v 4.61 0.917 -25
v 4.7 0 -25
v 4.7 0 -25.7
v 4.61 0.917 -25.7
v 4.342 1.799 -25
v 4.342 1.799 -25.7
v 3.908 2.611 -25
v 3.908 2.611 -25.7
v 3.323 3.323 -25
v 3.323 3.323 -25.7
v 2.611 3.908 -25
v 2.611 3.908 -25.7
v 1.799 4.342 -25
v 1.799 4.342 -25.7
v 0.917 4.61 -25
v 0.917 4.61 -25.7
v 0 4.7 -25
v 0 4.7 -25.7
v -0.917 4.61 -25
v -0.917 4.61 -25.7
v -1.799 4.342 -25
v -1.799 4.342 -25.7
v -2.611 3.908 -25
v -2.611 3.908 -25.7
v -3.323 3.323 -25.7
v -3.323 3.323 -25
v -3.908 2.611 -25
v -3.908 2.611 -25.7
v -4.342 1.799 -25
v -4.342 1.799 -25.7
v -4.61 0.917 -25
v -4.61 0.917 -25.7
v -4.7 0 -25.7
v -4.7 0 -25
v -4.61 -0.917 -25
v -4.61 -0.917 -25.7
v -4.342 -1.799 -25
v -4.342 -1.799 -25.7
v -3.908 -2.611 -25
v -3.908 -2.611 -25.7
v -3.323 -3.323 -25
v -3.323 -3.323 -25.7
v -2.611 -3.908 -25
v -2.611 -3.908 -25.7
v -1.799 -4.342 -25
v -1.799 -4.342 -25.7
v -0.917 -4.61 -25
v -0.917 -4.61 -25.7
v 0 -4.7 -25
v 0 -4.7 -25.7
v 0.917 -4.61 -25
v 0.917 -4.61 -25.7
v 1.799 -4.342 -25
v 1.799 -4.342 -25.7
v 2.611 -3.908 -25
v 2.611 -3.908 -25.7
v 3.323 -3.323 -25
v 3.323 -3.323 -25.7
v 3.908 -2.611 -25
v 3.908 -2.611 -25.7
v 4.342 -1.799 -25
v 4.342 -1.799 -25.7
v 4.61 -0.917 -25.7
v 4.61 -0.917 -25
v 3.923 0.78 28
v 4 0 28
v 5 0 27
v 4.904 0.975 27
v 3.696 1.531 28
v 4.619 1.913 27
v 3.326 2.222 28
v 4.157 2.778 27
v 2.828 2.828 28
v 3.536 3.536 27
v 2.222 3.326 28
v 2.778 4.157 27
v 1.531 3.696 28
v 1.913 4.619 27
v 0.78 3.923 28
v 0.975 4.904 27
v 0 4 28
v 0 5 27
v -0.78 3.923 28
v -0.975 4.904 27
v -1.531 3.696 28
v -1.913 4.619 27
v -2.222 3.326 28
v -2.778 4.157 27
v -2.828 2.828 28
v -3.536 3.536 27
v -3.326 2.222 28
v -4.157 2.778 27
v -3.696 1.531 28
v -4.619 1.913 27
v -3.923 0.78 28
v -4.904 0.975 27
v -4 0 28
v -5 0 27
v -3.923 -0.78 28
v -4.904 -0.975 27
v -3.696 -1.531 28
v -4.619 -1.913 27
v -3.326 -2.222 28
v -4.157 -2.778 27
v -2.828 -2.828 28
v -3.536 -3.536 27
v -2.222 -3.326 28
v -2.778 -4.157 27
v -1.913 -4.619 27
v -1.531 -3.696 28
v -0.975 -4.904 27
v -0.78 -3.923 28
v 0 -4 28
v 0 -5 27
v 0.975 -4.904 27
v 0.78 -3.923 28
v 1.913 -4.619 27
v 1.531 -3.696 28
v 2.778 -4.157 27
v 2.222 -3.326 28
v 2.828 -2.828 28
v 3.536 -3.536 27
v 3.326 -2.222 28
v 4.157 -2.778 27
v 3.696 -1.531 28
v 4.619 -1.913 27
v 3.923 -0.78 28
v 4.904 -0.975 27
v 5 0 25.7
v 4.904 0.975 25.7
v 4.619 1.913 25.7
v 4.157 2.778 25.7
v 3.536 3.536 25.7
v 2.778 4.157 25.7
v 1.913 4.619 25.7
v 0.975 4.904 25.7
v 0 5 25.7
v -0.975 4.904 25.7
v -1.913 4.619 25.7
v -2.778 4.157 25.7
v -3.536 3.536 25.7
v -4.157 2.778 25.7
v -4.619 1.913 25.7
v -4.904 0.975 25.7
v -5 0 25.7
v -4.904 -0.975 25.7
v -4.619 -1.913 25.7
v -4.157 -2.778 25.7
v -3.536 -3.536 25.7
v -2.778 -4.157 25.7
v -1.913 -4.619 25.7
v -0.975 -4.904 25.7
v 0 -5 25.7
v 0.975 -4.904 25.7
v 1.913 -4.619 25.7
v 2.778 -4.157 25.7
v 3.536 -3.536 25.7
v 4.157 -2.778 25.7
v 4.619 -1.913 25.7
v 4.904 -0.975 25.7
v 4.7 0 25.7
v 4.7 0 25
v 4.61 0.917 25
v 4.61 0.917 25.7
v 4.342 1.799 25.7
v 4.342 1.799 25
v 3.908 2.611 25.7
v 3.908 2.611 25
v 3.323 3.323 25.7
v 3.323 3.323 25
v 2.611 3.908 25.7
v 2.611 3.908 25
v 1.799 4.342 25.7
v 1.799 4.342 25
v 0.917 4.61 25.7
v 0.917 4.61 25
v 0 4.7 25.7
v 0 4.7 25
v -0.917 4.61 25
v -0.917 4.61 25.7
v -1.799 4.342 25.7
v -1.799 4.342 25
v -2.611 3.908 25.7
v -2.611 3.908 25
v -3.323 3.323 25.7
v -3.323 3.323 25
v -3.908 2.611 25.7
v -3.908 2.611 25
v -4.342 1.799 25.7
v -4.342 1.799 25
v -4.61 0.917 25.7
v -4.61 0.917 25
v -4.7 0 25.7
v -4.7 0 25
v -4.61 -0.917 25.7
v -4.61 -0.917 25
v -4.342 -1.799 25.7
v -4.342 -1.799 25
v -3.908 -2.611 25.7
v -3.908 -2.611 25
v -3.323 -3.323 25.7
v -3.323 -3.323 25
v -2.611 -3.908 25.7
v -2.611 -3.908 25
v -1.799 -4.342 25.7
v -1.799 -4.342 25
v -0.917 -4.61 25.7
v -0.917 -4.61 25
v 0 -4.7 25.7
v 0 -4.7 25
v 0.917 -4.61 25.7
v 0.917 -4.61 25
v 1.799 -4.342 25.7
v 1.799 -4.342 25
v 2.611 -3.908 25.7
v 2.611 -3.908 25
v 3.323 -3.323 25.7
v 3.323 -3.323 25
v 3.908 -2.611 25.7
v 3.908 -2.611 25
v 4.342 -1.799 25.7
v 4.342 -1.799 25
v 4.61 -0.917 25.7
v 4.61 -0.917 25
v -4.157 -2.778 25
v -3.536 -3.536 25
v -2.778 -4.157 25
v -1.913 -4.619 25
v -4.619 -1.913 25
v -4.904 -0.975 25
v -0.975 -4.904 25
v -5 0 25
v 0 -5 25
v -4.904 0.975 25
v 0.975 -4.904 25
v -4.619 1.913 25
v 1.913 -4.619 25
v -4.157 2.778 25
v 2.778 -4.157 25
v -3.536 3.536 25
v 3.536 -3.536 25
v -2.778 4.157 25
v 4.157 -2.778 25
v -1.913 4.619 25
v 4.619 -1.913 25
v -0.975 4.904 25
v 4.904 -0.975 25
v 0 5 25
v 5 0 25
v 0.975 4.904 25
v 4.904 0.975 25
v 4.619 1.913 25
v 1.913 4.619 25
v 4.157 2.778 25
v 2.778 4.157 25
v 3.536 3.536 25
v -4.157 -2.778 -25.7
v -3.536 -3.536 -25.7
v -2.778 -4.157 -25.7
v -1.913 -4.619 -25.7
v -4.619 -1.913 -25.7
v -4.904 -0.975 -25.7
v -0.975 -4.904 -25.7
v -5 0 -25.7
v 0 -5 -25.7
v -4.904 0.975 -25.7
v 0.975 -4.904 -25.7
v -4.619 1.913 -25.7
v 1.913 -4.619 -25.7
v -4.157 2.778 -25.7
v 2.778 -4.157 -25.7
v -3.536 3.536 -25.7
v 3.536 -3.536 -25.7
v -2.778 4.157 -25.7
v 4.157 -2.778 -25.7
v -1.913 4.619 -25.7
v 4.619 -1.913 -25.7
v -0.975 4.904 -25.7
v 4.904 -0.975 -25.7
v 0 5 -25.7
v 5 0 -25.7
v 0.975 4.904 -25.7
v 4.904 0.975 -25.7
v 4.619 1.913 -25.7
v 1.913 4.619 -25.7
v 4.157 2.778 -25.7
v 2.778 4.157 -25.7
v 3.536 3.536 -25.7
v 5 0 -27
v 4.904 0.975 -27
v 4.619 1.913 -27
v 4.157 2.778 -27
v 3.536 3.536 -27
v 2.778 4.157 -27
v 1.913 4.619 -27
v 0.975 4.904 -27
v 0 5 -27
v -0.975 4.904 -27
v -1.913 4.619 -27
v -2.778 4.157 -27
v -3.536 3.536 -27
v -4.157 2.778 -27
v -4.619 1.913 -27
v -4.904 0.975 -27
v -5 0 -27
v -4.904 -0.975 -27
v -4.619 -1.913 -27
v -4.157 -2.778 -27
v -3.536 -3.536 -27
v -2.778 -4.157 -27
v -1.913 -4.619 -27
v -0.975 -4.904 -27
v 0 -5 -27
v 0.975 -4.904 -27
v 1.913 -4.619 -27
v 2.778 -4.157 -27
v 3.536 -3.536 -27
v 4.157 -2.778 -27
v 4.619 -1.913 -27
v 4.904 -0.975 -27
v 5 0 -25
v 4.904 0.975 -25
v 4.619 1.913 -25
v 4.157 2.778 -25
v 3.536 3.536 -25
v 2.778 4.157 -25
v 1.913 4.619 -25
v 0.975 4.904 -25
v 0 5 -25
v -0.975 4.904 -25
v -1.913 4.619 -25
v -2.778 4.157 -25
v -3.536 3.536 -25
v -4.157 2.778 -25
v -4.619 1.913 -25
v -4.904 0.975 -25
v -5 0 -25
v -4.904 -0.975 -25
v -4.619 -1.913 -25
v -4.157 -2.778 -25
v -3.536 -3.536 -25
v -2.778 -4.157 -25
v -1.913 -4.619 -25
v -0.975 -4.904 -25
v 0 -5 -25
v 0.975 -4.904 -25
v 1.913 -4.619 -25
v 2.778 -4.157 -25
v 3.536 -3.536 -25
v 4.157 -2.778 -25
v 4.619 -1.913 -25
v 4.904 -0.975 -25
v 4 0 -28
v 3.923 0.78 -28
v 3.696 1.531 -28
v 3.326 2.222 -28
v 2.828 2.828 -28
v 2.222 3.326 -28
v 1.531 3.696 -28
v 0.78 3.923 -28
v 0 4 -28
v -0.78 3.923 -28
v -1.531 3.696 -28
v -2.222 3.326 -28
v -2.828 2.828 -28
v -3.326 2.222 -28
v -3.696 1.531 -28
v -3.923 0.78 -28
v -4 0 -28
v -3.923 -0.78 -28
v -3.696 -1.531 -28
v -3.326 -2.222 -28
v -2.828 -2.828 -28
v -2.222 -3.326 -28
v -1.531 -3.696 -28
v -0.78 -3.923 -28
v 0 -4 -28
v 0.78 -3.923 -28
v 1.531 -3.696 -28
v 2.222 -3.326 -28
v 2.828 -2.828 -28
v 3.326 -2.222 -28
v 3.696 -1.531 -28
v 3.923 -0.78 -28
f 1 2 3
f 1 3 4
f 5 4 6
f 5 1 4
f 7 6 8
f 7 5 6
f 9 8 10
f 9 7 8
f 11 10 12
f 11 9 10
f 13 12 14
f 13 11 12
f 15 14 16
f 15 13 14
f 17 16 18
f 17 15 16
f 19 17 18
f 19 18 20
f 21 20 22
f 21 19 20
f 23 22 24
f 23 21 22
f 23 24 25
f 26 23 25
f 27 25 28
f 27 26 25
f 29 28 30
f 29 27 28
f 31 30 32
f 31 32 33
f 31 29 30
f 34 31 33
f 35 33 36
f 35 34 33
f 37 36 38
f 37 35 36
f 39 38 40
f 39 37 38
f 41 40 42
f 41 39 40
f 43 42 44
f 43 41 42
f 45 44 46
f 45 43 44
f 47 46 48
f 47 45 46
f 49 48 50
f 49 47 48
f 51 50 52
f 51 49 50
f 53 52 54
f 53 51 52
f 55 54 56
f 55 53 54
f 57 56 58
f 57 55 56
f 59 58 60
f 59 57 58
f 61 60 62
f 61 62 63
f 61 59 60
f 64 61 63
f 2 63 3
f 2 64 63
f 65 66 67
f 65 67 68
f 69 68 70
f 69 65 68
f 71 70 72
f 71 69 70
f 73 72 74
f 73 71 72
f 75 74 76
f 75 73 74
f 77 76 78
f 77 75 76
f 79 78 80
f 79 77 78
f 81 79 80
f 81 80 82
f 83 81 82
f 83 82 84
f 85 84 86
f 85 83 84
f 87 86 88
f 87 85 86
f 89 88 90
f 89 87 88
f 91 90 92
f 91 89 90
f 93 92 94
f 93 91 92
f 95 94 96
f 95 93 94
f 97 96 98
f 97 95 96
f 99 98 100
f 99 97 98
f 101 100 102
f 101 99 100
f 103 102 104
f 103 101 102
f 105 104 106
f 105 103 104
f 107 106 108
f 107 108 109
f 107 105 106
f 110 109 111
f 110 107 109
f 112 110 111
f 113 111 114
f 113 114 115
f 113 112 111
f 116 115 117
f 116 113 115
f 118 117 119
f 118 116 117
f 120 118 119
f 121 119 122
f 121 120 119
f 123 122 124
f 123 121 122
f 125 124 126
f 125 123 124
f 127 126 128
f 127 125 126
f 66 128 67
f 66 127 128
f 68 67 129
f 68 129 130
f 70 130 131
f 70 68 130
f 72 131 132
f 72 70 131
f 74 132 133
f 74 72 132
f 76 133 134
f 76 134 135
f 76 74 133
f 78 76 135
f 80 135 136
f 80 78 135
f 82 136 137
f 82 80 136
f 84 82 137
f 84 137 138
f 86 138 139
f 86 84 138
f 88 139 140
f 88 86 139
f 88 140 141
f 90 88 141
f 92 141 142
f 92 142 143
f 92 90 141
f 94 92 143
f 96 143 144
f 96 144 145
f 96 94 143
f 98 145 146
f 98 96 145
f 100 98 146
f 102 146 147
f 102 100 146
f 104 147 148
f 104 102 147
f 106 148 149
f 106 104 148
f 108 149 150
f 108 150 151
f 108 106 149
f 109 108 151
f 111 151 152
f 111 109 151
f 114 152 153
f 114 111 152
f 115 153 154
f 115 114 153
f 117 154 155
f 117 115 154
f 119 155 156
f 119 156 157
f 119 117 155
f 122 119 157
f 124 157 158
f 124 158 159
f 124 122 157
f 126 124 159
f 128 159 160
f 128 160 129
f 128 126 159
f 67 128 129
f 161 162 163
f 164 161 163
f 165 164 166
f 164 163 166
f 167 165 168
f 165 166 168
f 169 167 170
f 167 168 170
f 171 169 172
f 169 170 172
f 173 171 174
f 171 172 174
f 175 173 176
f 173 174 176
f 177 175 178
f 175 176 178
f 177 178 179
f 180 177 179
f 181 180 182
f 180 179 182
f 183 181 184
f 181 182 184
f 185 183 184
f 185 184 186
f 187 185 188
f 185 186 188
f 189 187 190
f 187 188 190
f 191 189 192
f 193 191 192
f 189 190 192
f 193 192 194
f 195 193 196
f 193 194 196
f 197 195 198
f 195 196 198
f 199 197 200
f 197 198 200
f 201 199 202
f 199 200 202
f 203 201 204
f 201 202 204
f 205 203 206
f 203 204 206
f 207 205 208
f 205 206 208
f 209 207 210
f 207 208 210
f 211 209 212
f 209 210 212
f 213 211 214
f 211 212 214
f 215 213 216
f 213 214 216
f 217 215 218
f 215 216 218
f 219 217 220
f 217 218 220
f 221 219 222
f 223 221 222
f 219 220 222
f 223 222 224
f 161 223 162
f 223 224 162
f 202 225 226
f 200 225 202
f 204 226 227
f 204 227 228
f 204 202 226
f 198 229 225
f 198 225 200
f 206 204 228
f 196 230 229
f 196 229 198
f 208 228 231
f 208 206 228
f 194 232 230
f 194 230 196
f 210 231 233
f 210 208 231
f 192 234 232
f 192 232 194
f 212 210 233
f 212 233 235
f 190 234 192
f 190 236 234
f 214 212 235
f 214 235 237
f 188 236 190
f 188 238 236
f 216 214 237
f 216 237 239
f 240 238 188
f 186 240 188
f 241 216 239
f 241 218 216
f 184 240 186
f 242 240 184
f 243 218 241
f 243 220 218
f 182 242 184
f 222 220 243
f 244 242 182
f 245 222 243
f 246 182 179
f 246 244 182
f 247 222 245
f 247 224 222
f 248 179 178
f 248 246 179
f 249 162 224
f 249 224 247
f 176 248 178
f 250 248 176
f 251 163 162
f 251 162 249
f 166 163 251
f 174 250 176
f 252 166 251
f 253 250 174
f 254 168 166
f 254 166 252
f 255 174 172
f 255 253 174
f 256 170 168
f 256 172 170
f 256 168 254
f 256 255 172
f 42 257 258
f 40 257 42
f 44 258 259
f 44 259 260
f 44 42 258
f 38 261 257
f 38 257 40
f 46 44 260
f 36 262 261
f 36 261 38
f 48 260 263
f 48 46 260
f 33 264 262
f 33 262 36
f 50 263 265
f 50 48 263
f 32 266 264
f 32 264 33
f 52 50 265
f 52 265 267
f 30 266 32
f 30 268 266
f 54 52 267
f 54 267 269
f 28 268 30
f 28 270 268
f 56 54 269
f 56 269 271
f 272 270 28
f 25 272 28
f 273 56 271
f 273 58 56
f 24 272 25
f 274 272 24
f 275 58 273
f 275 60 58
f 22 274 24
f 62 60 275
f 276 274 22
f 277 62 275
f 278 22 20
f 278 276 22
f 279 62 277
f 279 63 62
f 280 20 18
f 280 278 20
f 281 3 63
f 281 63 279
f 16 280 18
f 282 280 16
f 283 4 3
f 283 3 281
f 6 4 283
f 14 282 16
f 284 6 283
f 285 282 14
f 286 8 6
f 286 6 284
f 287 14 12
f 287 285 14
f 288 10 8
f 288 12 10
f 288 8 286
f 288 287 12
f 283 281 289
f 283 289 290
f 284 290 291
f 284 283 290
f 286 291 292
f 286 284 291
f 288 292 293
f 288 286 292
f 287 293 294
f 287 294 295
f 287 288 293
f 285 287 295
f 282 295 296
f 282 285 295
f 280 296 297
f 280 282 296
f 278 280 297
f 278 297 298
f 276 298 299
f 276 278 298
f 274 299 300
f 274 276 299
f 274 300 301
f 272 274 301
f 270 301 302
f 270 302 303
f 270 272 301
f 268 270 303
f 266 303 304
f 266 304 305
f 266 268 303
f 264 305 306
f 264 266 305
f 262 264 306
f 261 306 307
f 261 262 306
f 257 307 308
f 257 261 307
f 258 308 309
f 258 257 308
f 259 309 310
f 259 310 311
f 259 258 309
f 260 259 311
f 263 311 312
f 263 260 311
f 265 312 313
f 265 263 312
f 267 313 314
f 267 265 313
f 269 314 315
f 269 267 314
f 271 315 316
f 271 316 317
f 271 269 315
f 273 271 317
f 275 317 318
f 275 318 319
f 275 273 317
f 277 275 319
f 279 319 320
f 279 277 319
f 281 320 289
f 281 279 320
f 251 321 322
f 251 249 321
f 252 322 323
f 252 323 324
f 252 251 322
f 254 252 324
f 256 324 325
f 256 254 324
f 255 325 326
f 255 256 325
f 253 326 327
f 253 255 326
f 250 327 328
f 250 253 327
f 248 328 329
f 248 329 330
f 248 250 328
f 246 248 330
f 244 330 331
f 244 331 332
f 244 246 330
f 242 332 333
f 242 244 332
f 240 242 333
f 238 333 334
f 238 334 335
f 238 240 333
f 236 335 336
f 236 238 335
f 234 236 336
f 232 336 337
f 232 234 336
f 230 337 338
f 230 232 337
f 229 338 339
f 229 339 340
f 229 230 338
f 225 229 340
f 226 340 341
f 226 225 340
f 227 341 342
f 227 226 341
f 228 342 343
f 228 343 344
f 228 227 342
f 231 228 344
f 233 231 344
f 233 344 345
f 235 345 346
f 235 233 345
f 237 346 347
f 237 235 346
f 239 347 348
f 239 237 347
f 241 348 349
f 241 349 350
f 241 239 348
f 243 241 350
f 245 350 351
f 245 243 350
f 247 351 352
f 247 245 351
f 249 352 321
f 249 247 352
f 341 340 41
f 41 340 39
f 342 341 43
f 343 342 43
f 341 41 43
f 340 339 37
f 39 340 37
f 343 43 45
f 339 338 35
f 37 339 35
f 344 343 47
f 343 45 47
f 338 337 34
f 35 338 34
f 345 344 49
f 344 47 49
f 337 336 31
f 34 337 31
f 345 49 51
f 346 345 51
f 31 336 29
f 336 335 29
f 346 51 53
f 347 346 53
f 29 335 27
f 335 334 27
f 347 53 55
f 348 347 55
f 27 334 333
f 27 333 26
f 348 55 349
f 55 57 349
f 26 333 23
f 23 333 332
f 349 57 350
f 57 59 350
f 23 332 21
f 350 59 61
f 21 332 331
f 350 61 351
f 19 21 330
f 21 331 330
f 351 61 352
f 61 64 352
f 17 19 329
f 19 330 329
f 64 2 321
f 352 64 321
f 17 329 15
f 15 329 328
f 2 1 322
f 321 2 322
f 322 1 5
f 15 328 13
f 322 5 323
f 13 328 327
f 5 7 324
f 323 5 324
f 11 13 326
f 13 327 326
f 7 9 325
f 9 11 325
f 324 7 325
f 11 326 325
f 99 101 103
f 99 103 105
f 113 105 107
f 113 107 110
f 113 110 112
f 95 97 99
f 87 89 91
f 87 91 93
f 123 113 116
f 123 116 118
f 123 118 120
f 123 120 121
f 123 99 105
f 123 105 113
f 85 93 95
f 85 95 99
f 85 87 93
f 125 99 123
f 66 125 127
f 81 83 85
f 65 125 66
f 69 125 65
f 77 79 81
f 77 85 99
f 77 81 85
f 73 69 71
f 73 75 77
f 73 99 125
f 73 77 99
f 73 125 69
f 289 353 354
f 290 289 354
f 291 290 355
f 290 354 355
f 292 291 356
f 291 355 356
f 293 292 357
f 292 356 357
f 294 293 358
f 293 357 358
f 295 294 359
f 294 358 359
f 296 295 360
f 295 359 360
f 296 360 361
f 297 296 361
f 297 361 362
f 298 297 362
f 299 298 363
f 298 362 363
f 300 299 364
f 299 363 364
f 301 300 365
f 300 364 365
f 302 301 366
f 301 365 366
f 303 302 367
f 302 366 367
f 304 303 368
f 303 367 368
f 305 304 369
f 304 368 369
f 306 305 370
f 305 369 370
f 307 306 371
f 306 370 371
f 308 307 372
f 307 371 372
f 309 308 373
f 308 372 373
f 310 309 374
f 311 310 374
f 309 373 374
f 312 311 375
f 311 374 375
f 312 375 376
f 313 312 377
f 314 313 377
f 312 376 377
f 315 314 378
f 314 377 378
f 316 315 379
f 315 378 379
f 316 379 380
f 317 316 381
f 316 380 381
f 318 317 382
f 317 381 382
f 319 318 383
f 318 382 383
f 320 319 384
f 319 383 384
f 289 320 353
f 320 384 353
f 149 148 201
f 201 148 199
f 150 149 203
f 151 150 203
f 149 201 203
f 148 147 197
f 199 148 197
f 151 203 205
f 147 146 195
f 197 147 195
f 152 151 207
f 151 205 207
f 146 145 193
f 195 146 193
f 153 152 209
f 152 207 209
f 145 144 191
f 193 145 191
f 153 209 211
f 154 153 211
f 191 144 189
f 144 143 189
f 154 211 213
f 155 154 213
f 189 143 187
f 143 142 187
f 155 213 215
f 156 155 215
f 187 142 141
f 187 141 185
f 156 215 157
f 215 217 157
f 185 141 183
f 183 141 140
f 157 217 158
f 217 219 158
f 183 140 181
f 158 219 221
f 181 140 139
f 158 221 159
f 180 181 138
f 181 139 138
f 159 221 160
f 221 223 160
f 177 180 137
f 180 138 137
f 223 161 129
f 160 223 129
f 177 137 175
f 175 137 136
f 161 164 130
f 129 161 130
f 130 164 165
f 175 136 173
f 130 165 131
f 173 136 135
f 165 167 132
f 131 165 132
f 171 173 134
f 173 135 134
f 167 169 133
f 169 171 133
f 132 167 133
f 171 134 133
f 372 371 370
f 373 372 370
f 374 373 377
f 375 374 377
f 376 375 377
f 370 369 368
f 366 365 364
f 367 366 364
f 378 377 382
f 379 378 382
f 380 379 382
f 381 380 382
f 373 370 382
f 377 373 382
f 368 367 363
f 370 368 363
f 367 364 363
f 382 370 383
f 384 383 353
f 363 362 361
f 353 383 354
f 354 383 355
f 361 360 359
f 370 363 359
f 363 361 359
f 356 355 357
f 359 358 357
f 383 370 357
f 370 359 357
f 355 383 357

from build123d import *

# Parameters (mm, degrees)
BOSS_EXTRUDE1_DEPTH      = 28
BOSS_EXTRUDE1_DEPTH_BACK = 28
SKETCH1_R                = 5
SKETCH2_R                = 14.7
SKETCH2_R_2              = 4.7
CUT_EXTRUDE_THIN1_DEPTH  = 0.7
CHAMFER1_SIZE            = 1


with BuildPart() as part:
    # Sketch1 → Boss-Extrude1 (new, two sides: drawn at the far end of the back side and taken through both)
    with BuildSketch(Plane.XY.offset(-BOSS_EXTRUDE1_DEPTH_BACK)):
        Circle(SKETCH1_R)
    extrude(amount=BOSS_EXTRUDE1_DEPTH + BOSS_EXTRUDE1_DEPTH_BACK)

    # Sketch2 → Cut-Extrude-Thin1 (cut)
    with BuildSketch(Plane.XY.offset(25)):
        Circle(SKETCH2_R)
        Circle(SKETCH2_R_2, mode=Mode.SUBTRACT)
    cut_extrude_thin1 = extrude(amount=CUT_EXTRUDE_THIN1_DEPTH, mode=Mode.SUBTRACT)

    # Mirror1: Cut-Extrude-Thin1 across plane
    add(cut_extrude_thin1.mirror(Plane.XY), mode=Mode.SUBTRACT)

    # Chamfer1
    chamfer1_edges = [part.edges().sort_by_distance(p)[0] for p in [
        (-5, 0, -28),
        (-5, 0, 28),
    ]]
    chamfer(chamfer1_edges, length=CHAMFER1_SIZE)


solid = part.part
